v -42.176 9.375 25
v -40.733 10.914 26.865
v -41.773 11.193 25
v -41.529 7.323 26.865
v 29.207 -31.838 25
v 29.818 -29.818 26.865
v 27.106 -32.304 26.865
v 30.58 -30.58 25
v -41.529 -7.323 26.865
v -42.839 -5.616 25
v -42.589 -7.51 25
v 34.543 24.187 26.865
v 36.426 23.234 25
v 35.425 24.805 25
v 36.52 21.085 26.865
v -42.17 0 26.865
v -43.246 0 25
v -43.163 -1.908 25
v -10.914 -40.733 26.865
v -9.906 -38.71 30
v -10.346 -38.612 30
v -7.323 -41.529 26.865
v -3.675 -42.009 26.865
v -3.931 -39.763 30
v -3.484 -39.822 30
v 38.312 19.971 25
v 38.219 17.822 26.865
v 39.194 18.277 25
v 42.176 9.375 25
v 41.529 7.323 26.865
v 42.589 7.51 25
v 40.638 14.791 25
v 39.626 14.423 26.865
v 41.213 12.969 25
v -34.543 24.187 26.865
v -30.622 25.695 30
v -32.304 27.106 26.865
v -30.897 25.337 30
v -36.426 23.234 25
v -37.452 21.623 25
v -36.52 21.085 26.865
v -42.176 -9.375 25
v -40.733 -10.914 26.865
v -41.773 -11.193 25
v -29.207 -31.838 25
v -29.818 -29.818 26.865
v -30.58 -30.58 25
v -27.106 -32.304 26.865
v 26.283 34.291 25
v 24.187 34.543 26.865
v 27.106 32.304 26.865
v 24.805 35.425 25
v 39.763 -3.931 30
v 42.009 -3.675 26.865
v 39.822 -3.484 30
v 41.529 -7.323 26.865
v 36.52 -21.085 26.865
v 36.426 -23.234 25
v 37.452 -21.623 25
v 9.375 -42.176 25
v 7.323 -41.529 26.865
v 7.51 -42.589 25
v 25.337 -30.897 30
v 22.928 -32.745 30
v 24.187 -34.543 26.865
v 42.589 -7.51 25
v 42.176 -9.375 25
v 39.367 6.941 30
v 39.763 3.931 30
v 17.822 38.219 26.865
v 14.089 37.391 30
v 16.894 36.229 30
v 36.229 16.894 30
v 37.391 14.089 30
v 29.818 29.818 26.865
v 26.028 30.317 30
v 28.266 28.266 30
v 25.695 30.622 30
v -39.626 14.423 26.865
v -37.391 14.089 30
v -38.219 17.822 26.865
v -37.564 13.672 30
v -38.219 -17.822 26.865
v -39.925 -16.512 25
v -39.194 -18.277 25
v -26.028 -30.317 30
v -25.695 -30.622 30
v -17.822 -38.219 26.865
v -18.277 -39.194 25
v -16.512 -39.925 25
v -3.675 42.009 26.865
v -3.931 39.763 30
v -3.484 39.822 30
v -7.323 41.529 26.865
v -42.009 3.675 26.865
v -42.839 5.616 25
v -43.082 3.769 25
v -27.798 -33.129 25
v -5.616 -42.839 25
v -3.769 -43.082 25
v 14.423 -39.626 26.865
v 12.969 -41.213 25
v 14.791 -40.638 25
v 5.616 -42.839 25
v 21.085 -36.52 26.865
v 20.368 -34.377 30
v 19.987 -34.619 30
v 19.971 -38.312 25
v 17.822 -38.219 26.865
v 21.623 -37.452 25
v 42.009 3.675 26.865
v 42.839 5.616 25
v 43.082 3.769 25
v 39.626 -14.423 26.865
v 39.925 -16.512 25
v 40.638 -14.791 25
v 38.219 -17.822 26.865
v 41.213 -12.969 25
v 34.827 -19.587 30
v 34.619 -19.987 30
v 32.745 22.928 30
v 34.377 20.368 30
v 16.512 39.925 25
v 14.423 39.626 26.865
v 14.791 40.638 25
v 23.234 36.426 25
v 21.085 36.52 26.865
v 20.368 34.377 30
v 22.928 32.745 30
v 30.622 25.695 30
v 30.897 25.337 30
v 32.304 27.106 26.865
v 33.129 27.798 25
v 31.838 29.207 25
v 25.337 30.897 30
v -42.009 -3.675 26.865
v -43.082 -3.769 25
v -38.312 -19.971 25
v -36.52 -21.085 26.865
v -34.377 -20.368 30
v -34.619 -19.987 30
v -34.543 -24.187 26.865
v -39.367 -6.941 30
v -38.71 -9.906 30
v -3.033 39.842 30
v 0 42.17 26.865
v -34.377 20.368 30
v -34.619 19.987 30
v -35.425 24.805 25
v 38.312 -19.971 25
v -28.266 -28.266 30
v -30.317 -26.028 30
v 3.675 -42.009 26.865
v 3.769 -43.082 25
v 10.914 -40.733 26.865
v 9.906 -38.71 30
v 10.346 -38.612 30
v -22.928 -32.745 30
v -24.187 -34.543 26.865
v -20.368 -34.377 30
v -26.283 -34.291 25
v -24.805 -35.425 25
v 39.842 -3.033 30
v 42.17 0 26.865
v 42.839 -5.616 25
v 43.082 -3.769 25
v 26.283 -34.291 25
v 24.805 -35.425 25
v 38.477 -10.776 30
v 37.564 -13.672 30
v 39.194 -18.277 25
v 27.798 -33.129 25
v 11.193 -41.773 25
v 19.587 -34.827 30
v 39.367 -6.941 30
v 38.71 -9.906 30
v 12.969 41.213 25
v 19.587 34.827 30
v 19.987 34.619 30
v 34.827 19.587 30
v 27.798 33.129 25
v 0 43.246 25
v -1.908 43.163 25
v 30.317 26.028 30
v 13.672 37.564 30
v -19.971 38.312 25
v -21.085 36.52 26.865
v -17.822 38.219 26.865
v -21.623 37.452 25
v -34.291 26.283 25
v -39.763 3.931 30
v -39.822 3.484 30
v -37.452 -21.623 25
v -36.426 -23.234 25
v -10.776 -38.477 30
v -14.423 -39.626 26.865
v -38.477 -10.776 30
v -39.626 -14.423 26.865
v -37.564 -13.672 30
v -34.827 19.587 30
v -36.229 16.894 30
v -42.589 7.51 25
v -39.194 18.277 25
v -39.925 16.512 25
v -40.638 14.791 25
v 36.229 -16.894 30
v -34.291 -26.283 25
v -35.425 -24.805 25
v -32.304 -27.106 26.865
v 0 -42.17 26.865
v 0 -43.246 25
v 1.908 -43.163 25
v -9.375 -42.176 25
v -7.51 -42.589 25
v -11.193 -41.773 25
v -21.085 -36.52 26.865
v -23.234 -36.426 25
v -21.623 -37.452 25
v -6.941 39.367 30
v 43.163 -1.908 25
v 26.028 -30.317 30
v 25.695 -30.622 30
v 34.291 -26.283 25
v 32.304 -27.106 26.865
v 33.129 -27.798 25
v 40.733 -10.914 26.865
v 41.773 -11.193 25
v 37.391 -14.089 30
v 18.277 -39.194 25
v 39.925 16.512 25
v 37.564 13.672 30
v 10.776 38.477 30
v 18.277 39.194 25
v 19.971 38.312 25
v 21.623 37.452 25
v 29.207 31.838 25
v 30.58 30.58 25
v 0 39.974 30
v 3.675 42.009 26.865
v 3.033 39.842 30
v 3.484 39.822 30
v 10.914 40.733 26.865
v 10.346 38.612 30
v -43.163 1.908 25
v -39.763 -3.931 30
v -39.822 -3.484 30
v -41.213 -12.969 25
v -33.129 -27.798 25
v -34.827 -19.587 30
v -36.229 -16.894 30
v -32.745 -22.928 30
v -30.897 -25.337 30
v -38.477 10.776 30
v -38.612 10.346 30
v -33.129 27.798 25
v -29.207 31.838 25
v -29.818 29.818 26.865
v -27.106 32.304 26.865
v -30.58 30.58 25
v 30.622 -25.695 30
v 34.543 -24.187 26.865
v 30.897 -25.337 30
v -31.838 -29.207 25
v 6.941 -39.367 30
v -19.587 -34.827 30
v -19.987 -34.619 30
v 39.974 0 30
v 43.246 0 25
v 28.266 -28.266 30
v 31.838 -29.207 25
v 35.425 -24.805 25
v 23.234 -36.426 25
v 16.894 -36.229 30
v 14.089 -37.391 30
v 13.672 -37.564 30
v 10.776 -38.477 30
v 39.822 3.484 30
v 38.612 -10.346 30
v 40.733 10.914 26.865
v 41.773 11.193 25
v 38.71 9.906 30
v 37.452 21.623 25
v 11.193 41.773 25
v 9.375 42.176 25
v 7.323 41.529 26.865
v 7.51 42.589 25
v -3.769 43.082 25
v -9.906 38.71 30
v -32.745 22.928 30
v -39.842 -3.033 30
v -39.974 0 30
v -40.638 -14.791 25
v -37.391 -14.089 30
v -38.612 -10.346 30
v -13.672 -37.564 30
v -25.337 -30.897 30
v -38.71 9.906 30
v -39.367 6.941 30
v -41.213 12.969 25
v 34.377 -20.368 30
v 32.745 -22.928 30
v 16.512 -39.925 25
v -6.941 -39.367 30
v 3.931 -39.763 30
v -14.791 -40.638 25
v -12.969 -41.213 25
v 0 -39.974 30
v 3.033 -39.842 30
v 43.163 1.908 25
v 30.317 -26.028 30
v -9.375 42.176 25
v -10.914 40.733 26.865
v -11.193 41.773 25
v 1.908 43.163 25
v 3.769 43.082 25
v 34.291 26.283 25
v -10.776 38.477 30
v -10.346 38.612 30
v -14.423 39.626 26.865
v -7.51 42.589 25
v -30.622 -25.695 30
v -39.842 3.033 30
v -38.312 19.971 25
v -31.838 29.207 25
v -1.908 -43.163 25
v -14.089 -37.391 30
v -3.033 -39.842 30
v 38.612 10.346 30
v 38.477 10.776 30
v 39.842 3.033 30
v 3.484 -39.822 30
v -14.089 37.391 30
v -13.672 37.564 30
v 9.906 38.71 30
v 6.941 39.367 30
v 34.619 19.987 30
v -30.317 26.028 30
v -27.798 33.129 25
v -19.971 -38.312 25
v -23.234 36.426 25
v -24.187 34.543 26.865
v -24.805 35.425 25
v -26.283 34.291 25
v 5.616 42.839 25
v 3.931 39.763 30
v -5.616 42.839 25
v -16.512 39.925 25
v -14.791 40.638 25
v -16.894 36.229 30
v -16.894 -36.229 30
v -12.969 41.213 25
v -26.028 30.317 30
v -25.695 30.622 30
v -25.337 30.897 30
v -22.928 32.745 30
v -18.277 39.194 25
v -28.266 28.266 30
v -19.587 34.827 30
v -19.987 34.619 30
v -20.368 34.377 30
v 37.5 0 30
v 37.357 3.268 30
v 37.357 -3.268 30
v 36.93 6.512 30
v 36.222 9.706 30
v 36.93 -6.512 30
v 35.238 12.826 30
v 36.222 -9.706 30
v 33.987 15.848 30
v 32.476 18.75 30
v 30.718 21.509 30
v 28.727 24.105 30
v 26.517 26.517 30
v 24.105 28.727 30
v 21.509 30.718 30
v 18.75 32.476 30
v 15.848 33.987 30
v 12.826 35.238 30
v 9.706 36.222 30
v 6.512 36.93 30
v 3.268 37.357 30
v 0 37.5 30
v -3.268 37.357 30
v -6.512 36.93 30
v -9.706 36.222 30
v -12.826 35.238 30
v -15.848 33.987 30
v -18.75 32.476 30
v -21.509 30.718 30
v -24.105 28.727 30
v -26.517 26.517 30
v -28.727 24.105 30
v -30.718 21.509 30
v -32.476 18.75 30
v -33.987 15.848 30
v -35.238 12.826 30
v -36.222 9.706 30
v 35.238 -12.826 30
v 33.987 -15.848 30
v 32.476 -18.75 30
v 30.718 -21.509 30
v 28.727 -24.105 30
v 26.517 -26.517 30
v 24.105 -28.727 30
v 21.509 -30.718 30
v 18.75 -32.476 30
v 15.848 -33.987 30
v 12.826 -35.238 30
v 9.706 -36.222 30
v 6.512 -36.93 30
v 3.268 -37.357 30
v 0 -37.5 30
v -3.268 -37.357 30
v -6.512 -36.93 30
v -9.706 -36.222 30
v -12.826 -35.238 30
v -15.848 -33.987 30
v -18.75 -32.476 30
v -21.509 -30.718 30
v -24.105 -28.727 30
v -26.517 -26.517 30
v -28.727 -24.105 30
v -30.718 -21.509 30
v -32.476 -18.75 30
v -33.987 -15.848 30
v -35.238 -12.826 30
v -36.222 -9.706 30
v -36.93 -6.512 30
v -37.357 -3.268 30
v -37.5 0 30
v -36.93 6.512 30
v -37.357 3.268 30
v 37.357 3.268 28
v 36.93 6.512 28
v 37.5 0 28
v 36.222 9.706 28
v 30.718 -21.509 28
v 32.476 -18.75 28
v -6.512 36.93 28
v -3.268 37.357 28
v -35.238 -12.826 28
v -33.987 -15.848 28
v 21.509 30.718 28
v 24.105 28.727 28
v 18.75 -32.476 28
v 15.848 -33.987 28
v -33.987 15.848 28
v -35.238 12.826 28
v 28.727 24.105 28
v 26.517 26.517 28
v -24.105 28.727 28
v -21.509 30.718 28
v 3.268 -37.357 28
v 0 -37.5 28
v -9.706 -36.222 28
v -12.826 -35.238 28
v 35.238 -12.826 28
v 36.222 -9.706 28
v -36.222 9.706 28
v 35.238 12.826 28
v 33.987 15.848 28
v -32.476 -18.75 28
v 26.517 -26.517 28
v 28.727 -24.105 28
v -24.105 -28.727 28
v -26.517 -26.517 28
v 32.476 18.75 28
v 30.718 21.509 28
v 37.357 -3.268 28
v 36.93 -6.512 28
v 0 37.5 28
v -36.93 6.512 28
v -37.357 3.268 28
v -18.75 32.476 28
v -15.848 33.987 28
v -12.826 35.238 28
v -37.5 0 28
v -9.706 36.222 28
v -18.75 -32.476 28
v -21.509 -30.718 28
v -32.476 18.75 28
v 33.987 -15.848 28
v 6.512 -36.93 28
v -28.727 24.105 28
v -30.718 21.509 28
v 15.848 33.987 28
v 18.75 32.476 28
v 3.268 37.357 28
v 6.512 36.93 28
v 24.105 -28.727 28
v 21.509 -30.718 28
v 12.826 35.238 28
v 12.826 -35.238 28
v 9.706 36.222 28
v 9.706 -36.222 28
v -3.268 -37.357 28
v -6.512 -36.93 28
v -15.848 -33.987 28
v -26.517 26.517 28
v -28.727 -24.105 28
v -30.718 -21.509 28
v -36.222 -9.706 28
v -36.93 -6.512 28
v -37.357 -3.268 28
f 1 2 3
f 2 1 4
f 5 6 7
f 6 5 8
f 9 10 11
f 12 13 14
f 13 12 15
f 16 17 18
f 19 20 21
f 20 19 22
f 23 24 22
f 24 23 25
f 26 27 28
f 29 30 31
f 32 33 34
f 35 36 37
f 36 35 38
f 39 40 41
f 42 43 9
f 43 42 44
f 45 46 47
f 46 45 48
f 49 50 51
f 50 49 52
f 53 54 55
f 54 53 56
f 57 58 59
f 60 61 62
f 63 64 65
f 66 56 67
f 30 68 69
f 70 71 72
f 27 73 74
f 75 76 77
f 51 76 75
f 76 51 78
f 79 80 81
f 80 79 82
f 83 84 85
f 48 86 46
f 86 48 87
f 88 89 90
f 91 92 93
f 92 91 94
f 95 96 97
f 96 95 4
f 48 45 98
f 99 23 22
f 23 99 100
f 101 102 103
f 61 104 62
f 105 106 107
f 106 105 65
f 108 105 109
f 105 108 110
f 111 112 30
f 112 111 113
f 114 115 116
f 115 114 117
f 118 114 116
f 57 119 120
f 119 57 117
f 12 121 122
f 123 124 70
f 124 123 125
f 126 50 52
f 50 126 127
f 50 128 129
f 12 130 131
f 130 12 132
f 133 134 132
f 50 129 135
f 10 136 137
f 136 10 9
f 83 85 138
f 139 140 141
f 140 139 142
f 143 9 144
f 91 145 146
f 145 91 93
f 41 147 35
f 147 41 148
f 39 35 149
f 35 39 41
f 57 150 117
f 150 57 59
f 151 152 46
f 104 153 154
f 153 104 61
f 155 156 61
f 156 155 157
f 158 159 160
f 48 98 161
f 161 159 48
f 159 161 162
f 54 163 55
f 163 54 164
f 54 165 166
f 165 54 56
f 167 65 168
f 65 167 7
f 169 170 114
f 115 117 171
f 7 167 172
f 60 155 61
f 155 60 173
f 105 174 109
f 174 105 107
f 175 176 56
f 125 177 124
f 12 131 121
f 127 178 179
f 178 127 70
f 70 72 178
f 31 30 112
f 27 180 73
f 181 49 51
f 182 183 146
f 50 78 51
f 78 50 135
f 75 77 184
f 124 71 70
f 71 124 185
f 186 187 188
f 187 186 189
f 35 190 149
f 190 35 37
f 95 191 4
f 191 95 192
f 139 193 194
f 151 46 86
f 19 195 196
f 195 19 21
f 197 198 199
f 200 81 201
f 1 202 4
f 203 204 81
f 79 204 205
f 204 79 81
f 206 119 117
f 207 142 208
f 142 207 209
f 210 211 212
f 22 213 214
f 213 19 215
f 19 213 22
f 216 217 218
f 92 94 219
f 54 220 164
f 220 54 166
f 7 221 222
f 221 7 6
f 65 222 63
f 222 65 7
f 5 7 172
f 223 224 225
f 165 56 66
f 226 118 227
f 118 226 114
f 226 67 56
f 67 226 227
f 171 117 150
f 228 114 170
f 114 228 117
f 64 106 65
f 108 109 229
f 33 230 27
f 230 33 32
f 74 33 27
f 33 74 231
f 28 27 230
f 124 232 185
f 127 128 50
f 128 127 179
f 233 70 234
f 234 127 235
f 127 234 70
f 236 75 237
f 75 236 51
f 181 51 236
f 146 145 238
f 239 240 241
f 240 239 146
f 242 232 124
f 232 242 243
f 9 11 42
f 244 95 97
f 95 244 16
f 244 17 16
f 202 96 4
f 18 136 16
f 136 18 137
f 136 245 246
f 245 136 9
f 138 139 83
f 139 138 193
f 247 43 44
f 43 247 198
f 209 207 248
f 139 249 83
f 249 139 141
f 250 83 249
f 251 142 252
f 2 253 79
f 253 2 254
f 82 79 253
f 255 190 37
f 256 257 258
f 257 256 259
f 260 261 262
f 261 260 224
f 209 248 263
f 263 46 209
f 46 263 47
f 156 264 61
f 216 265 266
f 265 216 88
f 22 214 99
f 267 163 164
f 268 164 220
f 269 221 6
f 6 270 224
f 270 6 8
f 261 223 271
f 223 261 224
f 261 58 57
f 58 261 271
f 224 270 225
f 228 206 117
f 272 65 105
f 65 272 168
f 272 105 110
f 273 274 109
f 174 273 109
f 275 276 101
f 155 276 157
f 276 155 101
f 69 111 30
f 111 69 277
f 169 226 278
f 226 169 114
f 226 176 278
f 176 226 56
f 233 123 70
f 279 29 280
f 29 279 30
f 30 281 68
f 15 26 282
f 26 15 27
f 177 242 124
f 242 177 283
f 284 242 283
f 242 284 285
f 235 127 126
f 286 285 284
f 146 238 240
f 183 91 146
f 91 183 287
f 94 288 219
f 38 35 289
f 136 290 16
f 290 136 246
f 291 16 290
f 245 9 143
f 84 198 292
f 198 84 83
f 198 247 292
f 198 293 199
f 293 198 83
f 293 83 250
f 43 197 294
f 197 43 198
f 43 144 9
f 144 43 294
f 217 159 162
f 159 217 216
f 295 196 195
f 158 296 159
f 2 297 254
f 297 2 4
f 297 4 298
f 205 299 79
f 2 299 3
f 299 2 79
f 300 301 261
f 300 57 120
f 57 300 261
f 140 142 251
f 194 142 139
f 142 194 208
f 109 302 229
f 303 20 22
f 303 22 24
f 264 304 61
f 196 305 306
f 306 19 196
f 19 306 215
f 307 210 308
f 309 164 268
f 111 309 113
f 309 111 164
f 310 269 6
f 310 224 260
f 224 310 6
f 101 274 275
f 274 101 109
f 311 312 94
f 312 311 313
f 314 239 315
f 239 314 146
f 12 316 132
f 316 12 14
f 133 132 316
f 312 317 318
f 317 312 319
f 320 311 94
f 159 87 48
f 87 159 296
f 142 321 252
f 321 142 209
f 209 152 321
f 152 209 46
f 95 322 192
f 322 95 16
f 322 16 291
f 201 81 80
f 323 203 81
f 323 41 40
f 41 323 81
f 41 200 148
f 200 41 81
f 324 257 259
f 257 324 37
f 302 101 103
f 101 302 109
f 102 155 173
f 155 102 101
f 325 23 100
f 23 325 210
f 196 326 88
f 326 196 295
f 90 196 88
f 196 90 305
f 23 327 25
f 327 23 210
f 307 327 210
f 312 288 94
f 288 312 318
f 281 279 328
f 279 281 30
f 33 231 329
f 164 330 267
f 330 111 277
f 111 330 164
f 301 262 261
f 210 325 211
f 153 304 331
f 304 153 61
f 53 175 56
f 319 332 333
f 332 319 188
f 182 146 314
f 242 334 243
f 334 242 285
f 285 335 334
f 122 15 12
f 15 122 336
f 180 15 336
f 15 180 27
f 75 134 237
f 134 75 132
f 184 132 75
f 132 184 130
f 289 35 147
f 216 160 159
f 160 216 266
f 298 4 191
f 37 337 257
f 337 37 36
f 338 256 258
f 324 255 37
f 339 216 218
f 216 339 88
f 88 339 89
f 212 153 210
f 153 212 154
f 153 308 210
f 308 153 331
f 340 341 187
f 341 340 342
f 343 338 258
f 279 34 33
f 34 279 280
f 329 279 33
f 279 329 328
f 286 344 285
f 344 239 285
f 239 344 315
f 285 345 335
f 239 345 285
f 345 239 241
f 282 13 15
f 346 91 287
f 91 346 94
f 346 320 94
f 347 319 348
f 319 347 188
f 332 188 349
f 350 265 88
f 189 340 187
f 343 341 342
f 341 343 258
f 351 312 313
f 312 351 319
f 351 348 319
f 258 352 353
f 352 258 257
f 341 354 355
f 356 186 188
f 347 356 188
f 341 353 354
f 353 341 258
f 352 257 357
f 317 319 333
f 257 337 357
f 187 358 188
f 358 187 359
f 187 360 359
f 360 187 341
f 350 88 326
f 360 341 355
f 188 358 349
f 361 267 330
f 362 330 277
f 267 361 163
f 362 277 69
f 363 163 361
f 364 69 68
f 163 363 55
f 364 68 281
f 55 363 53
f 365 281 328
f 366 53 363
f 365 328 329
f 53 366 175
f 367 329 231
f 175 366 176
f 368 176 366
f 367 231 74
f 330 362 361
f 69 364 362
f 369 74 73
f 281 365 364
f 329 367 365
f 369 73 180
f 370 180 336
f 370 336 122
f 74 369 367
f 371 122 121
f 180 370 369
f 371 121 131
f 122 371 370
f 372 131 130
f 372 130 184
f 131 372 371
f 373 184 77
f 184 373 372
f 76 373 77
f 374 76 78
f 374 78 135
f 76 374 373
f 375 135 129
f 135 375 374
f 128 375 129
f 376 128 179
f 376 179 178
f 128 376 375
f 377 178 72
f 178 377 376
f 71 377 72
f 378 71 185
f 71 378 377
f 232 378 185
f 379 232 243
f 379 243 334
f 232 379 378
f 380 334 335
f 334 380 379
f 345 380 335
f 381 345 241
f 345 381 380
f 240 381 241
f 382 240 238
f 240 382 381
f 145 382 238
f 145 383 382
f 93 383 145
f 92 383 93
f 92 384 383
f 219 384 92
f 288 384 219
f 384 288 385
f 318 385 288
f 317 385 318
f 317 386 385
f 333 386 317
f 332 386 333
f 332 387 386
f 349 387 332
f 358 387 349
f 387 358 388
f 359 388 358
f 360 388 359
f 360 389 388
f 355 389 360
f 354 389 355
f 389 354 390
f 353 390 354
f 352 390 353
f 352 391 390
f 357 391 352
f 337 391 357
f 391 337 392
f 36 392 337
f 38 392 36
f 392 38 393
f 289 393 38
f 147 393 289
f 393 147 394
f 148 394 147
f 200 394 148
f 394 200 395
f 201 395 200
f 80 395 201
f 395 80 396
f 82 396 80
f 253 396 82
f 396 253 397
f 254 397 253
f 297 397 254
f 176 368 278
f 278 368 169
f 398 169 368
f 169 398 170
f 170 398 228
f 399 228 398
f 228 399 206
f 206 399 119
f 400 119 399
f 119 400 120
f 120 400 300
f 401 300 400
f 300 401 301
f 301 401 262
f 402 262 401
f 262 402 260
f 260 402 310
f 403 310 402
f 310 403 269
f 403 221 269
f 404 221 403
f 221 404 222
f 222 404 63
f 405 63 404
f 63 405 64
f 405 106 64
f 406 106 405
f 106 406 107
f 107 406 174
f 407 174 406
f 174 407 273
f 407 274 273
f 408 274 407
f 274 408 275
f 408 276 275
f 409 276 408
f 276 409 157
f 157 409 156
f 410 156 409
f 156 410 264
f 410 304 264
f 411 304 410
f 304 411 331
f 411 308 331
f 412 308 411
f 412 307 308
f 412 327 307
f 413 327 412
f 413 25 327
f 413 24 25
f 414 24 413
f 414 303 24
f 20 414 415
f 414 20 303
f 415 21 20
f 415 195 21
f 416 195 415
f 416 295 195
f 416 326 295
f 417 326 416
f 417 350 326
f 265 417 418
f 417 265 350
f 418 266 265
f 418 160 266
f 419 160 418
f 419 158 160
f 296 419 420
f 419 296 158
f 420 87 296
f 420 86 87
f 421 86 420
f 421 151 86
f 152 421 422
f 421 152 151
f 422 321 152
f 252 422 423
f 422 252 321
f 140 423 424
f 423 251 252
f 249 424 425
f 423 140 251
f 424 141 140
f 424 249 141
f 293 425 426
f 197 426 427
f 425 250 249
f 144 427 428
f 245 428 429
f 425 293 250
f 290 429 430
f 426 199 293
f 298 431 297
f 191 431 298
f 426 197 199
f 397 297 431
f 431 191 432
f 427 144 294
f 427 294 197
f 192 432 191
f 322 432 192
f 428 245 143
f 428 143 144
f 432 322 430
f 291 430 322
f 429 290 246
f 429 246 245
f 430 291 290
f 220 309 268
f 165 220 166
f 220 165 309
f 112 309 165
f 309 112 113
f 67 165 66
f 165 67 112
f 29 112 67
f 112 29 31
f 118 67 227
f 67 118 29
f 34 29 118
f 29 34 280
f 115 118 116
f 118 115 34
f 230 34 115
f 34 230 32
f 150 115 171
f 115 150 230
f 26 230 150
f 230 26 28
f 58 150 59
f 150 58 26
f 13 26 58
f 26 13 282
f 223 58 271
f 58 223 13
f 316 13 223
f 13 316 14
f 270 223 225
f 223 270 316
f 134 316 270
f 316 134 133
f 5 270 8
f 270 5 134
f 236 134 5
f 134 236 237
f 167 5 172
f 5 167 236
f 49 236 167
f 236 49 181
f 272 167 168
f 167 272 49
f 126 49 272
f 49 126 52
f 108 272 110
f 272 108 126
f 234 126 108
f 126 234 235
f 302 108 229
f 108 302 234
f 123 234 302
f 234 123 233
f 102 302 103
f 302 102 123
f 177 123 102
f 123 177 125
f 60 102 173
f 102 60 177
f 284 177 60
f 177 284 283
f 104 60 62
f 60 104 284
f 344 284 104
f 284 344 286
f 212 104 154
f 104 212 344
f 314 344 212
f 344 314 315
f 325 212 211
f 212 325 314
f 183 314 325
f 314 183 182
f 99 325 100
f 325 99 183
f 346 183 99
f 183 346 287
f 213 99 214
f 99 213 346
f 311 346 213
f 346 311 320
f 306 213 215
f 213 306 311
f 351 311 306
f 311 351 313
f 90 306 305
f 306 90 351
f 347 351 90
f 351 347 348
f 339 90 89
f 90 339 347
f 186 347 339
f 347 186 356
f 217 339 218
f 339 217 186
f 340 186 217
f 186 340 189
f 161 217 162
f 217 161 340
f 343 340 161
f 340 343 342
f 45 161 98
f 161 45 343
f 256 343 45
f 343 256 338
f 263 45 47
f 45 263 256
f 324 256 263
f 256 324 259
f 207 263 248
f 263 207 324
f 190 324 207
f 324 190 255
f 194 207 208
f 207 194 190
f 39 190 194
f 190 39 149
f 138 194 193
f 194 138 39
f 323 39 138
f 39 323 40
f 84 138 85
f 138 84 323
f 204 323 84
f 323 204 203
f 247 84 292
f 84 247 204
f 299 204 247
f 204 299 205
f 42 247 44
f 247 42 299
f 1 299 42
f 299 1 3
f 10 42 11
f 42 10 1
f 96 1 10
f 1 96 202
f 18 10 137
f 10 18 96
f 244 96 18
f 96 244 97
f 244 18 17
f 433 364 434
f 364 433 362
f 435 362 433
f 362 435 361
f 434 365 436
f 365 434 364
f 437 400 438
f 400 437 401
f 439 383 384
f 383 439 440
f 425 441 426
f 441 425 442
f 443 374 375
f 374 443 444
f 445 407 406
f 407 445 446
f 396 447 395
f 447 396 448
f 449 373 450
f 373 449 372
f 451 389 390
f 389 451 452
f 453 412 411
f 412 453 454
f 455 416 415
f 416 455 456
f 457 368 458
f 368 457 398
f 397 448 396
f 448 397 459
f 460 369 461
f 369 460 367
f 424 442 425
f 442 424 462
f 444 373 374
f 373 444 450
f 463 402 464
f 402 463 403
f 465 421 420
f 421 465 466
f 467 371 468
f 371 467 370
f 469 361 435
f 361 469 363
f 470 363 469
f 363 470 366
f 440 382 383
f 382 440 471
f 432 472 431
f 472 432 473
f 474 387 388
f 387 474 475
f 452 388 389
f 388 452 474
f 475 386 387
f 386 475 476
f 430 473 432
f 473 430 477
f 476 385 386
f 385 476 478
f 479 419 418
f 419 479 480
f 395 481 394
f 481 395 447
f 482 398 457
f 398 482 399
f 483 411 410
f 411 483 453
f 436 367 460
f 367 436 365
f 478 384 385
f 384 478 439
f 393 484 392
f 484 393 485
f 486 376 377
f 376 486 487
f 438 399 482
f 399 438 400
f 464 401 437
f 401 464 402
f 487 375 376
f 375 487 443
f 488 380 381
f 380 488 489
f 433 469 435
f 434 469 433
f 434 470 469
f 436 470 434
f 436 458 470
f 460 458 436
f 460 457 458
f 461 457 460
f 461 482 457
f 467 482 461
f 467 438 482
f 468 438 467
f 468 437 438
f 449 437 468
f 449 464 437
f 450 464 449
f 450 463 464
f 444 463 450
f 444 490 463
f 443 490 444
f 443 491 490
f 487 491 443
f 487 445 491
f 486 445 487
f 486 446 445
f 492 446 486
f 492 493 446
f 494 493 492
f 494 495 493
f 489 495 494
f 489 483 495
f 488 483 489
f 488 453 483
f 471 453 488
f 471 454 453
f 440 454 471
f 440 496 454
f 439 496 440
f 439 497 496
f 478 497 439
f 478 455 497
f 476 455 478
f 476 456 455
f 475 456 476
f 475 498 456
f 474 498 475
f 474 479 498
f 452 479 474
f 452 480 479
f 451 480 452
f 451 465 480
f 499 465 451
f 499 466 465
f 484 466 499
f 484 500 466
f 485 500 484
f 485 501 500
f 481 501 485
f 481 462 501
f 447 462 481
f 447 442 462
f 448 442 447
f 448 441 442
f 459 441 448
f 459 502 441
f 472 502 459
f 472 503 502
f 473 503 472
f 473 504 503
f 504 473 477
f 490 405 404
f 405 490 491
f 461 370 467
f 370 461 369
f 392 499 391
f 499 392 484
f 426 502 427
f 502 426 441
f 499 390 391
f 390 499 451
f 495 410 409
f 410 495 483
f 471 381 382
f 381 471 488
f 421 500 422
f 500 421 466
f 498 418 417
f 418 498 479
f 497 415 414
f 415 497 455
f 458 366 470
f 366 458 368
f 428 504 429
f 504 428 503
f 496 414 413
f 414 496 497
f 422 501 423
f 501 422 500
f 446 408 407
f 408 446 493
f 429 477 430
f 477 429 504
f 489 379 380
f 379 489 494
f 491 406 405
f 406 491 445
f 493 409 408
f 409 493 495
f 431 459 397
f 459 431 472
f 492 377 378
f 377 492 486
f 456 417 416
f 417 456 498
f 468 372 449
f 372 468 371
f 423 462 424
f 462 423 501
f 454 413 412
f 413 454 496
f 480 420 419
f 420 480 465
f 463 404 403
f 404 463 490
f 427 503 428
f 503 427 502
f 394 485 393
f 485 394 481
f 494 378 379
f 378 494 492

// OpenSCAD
base = 100;
height=30;
embossed=2;

base_offset=25;

difference(){
  intersection(){
    sphere(d=base, center=true, $fa=5);
    translate([0,0,(height+base_offset)/2]) 
      cube([base,base, height-base_offset], center=true);
  }
  translate([0,0,height-embossed]) cylinder(d=base*0.75, h=embossed, $fa=5);
}


module letter_e() {
  height=10;
  width=6.5;
  thickness=1.5;
  translate([-width/2, -height/2])
    linear_extrude(height = 1, center = false) 
      polygon([[0,0], [0,height], [width,height], 
        [width, height-thickness], [thickness, height-thickness],
        [thickness, (height+thickness)/2], 
        [width-thickness/2, (height+thickness)/2],
        [width-thickness/2, (height-thickness)/2],
        [thickness, (height-thickness)/2],
        [thickness,thickness], [width,thickness], [width,0]]);
}

*translate([0, 0, height-embossed]) scale([5,5,embossed]) color("red") letter_e();

translate([-32.3,-20,height-embossed/2])
  linear_extrude(height = embossed, center = true, convexity = 10)
    import (file = "coaster_files/5.dxf", layer = "aa");

%cube([1, height*3, height*3], center=true);
%cube([height*3, 1, height*3], center=true);
